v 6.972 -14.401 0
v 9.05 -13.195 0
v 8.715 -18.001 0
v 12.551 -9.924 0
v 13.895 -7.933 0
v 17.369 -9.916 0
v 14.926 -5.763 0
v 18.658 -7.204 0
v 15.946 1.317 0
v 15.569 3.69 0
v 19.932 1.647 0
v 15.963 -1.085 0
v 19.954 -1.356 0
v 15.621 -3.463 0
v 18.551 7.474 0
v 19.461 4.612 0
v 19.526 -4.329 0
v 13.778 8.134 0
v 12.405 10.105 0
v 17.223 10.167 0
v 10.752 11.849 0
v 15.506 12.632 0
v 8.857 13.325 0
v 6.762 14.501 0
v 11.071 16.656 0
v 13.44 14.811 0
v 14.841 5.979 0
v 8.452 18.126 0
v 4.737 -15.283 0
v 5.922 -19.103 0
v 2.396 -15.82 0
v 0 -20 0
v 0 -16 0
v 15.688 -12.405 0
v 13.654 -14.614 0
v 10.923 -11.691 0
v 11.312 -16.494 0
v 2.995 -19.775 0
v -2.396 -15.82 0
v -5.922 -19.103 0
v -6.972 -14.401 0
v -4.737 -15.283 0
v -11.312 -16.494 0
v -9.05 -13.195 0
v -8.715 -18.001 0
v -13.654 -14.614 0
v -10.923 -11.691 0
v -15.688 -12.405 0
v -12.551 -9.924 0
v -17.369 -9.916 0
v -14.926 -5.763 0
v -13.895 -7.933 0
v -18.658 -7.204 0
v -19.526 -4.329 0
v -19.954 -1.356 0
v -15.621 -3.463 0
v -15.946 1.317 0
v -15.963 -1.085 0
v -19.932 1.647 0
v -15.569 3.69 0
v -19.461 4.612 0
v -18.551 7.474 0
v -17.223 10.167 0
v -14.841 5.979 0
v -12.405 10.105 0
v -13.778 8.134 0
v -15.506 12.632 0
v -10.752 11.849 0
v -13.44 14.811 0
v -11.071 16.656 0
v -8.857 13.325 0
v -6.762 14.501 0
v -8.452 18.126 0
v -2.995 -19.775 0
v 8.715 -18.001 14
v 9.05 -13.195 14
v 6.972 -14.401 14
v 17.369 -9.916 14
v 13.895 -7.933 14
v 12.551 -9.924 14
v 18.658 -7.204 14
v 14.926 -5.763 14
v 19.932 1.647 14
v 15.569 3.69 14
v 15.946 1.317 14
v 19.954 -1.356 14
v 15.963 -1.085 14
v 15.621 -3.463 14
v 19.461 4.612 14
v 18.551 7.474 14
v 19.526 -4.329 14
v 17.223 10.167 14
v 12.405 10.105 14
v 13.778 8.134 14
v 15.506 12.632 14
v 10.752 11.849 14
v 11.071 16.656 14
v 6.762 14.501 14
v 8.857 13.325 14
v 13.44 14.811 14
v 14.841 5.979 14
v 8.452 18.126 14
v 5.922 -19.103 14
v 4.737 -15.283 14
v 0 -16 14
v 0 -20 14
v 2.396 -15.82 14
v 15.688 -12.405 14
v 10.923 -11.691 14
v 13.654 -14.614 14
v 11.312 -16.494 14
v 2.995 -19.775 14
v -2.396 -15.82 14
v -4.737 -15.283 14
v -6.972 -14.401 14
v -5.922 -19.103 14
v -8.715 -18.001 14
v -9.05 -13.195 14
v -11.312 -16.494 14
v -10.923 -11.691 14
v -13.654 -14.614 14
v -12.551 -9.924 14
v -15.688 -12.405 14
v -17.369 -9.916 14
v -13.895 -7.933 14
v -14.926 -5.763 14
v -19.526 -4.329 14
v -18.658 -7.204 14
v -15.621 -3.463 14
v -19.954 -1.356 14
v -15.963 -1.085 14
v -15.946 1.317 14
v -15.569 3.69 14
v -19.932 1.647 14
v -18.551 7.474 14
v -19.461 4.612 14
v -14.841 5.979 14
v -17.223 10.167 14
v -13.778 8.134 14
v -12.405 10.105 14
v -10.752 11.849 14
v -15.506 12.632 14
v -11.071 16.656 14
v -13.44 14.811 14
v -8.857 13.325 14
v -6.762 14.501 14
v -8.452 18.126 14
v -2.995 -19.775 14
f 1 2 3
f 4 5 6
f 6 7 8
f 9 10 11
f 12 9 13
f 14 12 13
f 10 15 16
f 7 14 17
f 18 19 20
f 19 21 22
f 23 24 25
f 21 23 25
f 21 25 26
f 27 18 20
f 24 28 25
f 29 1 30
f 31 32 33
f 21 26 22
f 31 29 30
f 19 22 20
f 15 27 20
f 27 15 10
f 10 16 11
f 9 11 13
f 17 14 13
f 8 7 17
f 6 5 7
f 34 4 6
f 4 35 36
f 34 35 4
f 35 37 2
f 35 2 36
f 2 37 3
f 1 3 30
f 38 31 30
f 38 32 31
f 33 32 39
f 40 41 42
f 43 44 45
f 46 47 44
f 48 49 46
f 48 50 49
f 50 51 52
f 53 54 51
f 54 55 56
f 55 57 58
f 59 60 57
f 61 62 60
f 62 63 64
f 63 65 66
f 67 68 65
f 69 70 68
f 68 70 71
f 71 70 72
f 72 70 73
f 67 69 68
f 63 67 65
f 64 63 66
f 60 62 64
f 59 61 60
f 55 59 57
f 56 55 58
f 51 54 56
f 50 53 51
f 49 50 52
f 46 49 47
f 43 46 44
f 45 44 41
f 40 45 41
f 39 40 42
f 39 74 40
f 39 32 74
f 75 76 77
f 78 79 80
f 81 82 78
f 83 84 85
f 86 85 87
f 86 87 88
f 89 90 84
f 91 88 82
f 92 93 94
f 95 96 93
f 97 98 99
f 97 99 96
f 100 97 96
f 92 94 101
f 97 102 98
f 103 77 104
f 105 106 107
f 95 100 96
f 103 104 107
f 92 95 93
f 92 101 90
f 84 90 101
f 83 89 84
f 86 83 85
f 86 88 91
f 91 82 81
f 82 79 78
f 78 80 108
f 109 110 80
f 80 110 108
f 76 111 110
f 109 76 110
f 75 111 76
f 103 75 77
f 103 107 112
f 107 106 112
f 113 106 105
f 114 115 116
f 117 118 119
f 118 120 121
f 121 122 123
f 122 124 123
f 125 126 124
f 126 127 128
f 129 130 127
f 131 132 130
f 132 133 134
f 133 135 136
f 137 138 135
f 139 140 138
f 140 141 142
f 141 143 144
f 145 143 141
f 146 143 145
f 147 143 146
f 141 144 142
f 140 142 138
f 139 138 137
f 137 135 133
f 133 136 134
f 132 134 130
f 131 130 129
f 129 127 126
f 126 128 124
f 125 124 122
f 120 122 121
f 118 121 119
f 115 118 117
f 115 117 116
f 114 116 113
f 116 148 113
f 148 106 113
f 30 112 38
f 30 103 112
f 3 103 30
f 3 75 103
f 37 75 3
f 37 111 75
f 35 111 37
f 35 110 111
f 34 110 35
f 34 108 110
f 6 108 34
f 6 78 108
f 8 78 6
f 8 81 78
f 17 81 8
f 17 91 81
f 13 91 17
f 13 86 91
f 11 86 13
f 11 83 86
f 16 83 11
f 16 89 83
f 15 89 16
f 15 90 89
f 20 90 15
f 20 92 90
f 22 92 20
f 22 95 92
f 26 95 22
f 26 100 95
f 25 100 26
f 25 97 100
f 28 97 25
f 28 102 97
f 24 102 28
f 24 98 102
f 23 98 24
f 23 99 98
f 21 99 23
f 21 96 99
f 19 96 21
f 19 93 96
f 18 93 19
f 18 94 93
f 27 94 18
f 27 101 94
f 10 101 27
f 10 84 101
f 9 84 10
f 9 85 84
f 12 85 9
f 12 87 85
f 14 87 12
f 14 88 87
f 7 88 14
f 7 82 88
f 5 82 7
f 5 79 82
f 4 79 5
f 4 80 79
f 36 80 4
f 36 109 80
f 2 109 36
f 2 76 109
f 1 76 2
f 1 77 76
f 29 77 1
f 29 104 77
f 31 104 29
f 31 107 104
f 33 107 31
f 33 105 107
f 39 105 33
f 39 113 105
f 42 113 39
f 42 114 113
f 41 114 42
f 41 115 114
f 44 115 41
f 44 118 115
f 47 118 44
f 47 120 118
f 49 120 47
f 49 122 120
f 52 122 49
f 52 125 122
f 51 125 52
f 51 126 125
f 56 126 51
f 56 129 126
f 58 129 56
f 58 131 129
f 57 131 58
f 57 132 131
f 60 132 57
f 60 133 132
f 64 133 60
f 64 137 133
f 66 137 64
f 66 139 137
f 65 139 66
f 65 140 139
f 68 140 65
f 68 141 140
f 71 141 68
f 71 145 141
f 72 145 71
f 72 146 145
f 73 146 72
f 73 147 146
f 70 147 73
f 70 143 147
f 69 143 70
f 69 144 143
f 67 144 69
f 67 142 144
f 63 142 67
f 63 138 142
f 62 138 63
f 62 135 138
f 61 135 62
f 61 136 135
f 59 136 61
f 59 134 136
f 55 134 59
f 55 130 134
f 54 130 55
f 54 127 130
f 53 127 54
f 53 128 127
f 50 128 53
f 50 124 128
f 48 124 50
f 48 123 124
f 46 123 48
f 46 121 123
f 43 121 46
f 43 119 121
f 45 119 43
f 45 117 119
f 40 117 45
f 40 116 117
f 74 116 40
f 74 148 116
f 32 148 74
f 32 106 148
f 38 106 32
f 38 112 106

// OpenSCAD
$fn = 32;

// ----------------------------------------------------------------------
// Spring clip: 40 mm outside, 4 mm band, 50 degree opening
// ----------------------------------------------------------------------

// --- parameters (mm) ---
outer_r = 20;             // clip outside radius
inner_r = 16;             // clip bore radius
band = 4;                 // band thickness
clip_w = 14;              // clip width
opening = 50;             // opening angle

clip_profile = [[-8.452, 18.126], [-11.071, 16.656], [-13.44, 14.811], [-15.506, 12.632], [-17.223, 10.167], [-18.551, 7.474], [-19.461, 4.612], [-19.932, 1.647], [-19.954, -1.356], [-19.526, -4.329], [-18.658, -7.204], [-17.369, -9.916], [-15.688, -12.405], [-13.654, -14.614], [-11.312, -16.494], [-8.715, -18.001], [-5.922, -19.103], [-2.995, -19.775], [0, -20], [2.995, -19.775], [5.922, -19.103], [8.715, -18.001], [11.312, -16.494], [13.654, -14.614], [15.688, -12.405], [17.369, -9.916], [18.658, -7.204], [19.526, -4.329], [19.954, -1.356], [19.932, 1.647], [19.461, 4.612], [18.551, 7.474], [17.223, 10.167], [15.506, 12.632], [13.44, 14.811], [11.071, 16.656], [8.452, 18.126], [6.762, 14.501], [8.857, 13.325], [10.752, 11.849], [12.405, 10.105], [13.778, 8.134], [14.841, 5.979], [15.569, 3.69], [15.946, 1.317], [15.963, -1.085], [15.621, -3.463], [14.926, -5.763], [13.895, -7.933], [12.551, -9.924], [10.923, -11.691], [9.05, -13.195], [6.972, -14.401], [4.737, -15.283], [2.396, -15.82], [0, -16], [-2.396, -15.82], [-4.737, -15.283], [-6.972, -14.401], [-9.05, -13.195], [-10.923, -11.691], [-12.551, -9.924], [-13.895, -7.933], [-14.926, -5.763], [-15.621, -3.463], [-15.963, -1.085], [-15.946, 1.317], [-15.569, 3.69], [-14.841, 5.979], [-13.778, 8.134], [-12.405, 10.105], [-10.752, 11.849], [-8.857, 13.325], [-6.762, 14.501]];

difference() {
  union() {
    linear_extrude(height = clip_w) polygon(clip_profile);
  }
}
